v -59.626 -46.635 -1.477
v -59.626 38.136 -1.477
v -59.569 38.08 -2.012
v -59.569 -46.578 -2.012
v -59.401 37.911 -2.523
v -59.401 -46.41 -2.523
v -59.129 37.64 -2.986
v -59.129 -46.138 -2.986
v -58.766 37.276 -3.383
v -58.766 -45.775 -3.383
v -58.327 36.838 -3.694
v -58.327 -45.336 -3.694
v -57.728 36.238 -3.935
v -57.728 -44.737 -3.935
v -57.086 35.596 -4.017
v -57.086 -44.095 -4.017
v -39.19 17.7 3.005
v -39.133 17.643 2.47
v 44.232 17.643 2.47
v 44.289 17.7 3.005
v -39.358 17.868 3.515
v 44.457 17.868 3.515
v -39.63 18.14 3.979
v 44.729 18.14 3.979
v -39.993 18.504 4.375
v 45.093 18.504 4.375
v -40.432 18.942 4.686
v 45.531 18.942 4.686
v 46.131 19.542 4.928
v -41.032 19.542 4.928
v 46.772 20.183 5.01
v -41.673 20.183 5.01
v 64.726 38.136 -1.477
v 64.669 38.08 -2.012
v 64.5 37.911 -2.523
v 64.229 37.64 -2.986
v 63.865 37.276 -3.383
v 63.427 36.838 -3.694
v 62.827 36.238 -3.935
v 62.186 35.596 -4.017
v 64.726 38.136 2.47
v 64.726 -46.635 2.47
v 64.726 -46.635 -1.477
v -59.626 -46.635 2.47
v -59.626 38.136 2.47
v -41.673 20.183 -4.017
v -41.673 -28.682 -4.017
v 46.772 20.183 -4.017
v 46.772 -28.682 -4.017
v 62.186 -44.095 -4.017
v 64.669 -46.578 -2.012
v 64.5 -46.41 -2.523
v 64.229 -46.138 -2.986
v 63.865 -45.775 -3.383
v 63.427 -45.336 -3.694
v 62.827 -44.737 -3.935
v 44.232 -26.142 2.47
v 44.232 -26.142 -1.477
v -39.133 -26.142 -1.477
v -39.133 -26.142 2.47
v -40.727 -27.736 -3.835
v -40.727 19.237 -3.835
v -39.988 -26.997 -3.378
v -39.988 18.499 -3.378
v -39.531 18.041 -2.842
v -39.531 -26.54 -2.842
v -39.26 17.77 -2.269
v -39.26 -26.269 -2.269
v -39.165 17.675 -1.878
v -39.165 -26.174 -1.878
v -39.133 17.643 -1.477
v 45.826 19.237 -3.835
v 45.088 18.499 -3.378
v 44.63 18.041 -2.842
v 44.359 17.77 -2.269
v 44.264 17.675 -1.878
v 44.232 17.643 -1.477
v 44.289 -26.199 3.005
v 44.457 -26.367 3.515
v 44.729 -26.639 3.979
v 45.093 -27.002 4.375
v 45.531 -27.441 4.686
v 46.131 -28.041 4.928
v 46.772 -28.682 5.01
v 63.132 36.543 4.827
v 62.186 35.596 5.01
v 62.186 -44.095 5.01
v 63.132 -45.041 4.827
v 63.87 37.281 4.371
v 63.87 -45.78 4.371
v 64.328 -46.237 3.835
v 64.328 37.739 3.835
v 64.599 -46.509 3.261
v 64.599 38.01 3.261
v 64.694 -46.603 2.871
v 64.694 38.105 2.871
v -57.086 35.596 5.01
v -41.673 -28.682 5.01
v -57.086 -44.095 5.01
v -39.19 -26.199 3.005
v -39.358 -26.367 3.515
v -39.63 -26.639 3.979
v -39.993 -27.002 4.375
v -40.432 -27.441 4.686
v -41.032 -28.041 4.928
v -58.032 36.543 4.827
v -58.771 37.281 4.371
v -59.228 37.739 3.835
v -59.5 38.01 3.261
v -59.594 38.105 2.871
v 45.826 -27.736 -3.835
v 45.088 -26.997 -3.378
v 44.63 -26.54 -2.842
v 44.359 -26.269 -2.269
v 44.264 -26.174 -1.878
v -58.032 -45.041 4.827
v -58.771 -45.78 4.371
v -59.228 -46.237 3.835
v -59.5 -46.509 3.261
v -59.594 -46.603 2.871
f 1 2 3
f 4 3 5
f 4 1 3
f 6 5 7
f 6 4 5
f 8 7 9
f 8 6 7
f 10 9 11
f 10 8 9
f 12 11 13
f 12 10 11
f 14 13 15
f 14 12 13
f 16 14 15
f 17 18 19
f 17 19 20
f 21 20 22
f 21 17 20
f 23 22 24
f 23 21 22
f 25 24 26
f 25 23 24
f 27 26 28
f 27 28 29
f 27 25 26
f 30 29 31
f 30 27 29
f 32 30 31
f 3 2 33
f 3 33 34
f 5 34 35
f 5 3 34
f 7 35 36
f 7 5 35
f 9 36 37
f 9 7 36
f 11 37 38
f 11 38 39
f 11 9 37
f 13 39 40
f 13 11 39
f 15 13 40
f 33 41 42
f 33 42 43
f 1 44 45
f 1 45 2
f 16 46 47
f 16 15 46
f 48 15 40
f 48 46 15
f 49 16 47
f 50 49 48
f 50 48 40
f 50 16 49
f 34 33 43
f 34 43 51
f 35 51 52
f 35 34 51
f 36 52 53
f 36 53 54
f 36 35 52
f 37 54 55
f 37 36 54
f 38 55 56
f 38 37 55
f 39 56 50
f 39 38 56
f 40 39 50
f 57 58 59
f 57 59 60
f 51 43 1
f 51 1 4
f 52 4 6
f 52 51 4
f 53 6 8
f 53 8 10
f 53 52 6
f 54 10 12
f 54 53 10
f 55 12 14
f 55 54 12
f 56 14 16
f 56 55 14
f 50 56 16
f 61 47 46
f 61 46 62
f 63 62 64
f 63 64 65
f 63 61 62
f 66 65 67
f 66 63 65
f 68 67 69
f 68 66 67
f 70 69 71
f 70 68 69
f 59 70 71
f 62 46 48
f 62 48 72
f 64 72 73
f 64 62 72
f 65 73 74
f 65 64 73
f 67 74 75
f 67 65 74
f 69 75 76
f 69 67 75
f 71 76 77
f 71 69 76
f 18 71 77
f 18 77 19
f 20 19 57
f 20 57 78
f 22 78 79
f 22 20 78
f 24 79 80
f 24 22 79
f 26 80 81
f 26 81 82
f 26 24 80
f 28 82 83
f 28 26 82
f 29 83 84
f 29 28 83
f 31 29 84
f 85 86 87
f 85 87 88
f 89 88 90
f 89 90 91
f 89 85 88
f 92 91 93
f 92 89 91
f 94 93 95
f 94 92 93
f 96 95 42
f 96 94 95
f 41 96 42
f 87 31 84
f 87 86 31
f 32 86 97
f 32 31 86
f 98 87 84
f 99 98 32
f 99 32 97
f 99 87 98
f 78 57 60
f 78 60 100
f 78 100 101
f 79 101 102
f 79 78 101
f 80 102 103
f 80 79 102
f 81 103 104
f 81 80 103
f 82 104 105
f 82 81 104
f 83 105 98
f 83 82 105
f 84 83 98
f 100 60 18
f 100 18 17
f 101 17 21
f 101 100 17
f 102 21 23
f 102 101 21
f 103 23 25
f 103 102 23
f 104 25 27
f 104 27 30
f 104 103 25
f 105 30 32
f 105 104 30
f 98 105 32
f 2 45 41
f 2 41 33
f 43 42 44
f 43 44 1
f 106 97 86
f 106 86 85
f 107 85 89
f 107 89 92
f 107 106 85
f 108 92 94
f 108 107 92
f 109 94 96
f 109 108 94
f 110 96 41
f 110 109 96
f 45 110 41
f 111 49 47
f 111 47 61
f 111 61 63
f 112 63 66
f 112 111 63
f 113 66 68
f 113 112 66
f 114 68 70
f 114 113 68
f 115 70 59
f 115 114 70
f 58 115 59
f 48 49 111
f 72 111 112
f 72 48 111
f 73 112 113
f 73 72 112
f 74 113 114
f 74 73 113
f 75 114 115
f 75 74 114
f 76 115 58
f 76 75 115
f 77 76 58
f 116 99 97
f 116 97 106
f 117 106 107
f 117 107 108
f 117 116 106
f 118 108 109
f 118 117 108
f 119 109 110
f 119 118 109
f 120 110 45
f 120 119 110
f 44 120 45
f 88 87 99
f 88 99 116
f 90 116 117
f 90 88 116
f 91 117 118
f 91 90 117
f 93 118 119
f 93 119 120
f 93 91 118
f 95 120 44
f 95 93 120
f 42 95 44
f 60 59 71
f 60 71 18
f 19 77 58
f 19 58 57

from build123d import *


with BuildPart() as f3:
    # F3: sweep along a path in F0
    with BuildLine(Plane.XY) as f3_path:
        Line((-49.0501374006, 27.5603476912), (-49.0501374006, -36.0591337085))
        Line((-49.0501374006, -36.0591337085), (54.1494078934, -36.0591337085))
        Line((54.1494078934, -36.0591337085), (54.1494078934, 27.5603476912))
        Line((54.1494078934, 27.5603476912), (-49.0501374006, 27.5603476912))
    # F2 (on line) → F3 (sweep)
    with BuildSketch(Plane.XZ.offset(36.0591337085)):
        with BuildLine():
            Line((-41.6731166029, 5.010060966), (-57.0862477338, 5.010060966))
            ThreePointArc((-57.0862477338, 5.010060966), (-58.882298958, 4.2661121902), (-59.6262477338, 2.470060966))
            Line((-59.6262477338, 2.470060966), (-59.6262477338, -1.477370753))
            ThreePointArc((-59.6262477338, -1.477370753), (-58.882298958, -3.2734219772), (-57.0862477338, -4.017370753))
            Line((-57.0862477338, -4.017370753), (-41.6731166029, -4.017370753))
            ThreePointArc((-41.6731166029, -4.017370753), (-39.8770653787, -3.2734219772), (-39.1331166029, -1.477370753))
            Line((-39.1331166029, -1.477370753), (-39.1331166029, 2.470060966))
            ThreePointArc((-39.1331166029, 2.470060966), (-39.8770653787, 4.2661121902), (-41.6731166029, 5.010060966))
        make_face()
    sweep(path=f3_path.line, transition=Transition.RIGHT)


solid = f3.part
